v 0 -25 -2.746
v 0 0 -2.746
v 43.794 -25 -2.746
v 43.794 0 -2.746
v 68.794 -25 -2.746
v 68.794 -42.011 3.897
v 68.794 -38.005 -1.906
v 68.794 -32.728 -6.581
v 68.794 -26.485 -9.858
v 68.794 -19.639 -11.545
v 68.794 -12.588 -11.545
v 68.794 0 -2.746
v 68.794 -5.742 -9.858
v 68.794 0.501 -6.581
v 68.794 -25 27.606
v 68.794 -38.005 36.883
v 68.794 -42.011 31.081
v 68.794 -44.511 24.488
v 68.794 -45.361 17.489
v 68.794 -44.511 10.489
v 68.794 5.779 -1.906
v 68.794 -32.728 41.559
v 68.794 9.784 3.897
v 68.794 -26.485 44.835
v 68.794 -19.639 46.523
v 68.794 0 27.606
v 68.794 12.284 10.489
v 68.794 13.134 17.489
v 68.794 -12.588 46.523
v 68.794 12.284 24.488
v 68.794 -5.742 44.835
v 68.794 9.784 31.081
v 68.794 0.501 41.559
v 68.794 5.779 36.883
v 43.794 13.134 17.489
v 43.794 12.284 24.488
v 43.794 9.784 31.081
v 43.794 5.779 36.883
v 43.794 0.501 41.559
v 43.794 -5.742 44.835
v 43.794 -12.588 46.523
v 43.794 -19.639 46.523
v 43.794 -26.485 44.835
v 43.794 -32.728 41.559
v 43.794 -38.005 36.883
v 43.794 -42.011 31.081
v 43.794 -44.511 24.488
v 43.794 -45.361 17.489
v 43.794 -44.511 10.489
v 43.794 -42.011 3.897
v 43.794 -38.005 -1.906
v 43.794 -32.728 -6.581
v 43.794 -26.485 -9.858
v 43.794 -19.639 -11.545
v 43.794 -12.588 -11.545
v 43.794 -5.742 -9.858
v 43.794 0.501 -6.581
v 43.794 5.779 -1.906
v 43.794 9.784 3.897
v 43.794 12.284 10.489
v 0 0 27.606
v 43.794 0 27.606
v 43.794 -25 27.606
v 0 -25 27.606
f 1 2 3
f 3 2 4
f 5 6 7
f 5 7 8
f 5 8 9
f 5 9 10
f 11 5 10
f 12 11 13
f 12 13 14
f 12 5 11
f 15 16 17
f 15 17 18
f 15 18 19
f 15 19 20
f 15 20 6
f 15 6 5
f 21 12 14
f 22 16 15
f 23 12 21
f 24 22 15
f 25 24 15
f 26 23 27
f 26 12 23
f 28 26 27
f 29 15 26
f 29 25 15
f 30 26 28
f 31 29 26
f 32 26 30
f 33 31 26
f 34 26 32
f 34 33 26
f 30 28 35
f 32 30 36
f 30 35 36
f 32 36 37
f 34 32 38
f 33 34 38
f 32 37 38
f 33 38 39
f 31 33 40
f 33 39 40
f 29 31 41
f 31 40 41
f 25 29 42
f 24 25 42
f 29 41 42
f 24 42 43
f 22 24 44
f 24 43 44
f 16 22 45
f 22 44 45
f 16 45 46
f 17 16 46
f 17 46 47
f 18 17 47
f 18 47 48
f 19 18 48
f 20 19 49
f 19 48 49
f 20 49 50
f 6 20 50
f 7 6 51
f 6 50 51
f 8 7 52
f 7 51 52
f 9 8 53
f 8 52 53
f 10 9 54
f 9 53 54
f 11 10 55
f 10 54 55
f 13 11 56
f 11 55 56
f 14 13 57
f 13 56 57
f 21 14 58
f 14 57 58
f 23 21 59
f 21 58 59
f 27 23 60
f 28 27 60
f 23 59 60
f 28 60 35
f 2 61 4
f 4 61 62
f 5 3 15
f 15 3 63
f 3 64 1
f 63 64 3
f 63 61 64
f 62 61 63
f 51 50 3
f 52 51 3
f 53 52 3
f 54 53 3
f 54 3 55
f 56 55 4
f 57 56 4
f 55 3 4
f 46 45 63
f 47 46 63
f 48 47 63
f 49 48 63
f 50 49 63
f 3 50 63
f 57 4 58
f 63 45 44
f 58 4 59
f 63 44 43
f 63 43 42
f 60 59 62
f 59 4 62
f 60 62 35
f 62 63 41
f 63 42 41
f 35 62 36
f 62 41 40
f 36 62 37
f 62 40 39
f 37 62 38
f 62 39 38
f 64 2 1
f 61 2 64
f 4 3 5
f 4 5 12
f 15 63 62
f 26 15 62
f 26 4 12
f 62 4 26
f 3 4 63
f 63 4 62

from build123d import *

# Parameters (mm, degrees)
F0_W     = 43.793824
F0_H     = 30.352155
F1_DEPTH = 25
F2_R     = 29.247355
F2_W     = 25
F2_H     = 30.352155
F3_DEPTH = 25


with BuildPart() as f1:
    # F0 (on Front) → F1 (new body)
    with BuildSketch(Plane.XZ):
        with Locations((21.896912, 12.429932)):
            Rectangle(F0_W, F0_H)
    extrude(amount=F1_DEPTH)


with BuildPart() as f3:
    # F2 (on face) → F3 (new body)
    with BuildSketch(Plane.YZ.offset(43.793824)):
        with Locations((-16.11335, 17.488627)):
            Circle(F2_R)
        with Locations((-12.5, 12.429932)):
            Rectangle(F2_W, F2_H, mode=Mode.SUBTRACT)
    extrude(amount=F3_DEPTH)


solid = Compound([f1.part, f3.part])
